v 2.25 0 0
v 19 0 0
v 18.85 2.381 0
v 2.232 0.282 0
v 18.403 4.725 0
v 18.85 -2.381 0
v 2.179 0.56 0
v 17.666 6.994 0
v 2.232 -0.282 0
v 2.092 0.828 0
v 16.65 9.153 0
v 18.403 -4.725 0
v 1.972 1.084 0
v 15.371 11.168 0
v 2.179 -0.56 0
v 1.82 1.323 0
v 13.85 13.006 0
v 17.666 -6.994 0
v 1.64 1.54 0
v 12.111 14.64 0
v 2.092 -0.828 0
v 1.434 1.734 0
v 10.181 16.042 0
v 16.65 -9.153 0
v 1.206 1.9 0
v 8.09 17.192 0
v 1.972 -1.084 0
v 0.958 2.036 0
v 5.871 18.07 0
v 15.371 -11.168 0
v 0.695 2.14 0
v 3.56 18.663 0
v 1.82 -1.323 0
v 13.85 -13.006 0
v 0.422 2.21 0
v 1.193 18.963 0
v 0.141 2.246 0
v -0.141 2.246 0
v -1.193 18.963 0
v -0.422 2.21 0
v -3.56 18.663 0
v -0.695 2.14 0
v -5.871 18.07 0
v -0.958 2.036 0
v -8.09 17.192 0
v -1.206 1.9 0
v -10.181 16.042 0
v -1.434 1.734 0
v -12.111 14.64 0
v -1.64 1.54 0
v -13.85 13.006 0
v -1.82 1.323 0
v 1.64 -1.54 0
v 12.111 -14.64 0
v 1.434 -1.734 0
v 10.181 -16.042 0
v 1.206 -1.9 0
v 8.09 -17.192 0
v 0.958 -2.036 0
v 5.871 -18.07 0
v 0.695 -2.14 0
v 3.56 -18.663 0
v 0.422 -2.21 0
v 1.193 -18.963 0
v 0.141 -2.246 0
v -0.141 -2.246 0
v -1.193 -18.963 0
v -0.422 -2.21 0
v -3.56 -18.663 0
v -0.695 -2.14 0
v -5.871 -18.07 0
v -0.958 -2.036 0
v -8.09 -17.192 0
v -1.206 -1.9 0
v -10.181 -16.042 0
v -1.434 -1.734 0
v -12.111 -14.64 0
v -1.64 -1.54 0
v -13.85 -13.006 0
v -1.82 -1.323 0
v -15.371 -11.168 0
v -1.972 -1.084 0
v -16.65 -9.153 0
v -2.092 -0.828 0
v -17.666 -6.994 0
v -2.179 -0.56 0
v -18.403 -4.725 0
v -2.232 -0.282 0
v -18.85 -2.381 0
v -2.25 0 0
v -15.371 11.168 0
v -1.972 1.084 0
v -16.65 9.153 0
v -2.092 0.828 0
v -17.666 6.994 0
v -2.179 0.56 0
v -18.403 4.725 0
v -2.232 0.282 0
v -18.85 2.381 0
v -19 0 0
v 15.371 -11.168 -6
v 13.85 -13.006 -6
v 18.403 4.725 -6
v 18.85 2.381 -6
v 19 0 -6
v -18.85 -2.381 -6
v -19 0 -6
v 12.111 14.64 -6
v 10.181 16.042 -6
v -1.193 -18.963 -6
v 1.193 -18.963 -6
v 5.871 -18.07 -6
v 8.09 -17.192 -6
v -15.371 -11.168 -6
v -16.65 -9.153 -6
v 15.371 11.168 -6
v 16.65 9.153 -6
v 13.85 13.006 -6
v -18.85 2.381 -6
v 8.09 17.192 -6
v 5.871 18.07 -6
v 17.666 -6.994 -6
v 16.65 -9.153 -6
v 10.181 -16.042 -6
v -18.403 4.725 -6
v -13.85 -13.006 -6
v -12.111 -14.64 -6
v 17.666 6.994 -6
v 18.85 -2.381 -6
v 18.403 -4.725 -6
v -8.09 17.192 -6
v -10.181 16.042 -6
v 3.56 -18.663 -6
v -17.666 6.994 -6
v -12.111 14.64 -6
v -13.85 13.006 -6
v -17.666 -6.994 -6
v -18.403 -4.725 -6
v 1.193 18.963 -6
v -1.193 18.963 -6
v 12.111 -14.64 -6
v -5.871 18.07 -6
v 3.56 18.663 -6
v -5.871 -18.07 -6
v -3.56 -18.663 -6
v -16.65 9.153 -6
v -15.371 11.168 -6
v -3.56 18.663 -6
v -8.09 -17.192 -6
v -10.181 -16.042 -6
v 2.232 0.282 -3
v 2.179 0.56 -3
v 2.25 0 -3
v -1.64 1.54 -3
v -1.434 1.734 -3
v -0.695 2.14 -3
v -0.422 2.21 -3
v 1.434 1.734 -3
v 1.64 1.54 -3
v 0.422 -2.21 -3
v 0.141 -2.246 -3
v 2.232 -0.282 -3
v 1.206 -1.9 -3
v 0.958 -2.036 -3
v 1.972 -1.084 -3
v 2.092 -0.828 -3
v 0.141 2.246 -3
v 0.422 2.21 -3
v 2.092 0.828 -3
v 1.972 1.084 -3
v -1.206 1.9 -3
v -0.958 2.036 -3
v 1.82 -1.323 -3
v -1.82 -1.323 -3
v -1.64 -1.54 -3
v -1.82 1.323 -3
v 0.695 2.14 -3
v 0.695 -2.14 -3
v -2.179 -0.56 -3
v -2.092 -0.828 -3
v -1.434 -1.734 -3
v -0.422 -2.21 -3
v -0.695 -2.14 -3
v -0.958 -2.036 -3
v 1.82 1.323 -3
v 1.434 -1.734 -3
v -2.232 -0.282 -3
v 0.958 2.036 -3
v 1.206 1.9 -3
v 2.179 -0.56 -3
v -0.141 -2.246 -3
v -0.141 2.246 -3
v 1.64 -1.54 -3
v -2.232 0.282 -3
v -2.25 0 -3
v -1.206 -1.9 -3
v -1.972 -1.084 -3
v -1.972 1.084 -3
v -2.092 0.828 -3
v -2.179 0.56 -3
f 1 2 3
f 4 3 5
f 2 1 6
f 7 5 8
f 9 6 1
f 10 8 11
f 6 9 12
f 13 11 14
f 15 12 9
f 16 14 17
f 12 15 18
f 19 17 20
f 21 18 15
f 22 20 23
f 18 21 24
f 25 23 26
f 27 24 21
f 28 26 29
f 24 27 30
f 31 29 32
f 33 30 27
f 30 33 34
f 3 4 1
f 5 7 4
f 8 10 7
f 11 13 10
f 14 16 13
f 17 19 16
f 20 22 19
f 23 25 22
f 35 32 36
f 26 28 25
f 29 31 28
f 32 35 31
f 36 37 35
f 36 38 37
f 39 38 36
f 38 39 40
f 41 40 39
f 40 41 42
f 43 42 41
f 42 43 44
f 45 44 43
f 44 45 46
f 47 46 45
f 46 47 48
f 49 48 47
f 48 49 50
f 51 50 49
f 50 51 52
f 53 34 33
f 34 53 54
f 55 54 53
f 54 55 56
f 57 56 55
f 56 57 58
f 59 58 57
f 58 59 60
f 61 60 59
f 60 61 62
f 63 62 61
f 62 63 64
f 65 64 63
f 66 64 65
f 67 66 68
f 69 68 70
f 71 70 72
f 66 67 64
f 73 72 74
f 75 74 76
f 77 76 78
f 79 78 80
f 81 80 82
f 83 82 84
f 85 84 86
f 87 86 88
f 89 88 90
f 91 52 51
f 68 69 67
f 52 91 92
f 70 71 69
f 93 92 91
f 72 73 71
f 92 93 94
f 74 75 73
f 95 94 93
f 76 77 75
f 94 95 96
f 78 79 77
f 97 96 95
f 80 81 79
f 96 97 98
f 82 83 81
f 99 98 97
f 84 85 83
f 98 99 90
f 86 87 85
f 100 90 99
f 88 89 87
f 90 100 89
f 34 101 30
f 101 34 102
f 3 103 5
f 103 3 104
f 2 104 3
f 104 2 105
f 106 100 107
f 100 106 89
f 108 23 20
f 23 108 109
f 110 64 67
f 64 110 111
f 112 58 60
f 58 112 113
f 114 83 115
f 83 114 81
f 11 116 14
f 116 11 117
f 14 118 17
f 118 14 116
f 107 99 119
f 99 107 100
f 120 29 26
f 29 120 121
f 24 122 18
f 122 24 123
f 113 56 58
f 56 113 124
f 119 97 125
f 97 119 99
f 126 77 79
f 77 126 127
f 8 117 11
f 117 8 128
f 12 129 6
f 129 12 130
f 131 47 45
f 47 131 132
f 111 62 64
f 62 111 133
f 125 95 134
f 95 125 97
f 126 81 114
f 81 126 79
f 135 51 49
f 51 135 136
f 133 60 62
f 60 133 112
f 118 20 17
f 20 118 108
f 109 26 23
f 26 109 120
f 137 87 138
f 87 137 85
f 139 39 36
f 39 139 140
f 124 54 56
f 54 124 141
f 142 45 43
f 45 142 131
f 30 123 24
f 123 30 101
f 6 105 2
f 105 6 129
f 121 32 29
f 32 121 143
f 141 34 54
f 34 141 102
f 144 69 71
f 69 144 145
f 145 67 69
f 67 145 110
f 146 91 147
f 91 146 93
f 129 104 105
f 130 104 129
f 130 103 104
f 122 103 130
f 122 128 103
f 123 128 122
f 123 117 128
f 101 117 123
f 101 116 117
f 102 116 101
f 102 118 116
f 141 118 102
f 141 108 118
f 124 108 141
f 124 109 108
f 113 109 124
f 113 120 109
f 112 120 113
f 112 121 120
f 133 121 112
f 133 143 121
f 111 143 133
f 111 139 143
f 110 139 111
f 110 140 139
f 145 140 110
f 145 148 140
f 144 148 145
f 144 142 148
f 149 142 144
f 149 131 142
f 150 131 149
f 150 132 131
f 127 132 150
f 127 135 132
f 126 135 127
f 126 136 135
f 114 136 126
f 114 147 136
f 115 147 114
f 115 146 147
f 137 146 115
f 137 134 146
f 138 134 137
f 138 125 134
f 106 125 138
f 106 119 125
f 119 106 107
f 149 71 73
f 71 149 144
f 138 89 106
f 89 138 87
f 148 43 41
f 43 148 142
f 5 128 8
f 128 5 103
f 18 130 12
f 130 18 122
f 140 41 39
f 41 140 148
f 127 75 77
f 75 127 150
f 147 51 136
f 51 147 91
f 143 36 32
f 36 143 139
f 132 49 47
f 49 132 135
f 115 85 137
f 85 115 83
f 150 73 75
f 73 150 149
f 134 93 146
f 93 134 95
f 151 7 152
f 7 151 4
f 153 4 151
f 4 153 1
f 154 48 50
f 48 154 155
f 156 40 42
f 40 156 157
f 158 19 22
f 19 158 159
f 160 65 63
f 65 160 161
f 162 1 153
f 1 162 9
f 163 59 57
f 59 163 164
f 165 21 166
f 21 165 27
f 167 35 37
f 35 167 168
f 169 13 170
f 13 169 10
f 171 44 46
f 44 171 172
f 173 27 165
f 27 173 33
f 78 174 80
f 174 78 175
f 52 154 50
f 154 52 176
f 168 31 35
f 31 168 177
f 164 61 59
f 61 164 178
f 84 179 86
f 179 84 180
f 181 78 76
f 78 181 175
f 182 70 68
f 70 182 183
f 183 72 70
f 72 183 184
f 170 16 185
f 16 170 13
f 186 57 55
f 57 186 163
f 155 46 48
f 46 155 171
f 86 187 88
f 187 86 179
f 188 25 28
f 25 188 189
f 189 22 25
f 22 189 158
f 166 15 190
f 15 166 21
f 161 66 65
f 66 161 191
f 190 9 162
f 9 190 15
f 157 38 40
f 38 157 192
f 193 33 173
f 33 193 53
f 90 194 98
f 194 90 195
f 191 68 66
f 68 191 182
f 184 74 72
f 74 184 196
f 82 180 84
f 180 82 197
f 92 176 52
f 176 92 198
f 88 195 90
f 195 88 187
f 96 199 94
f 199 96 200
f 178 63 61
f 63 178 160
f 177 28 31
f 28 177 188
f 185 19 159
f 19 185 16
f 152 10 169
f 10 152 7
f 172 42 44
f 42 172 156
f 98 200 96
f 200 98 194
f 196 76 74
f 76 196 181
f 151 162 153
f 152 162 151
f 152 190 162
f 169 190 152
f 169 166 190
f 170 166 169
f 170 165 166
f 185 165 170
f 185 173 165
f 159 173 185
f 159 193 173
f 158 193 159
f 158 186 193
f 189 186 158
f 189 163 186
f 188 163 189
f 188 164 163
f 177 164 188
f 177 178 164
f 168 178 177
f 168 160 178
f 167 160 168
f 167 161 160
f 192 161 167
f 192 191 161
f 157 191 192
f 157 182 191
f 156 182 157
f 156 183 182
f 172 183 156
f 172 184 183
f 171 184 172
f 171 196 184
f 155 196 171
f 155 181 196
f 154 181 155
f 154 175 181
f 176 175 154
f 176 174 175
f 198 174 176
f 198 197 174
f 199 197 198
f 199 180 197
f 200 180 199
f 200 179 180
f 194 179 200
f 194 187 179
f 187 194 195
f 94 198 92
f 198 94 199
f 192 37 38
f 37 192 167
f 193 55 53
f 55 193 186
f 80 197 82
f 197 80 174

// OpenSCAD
$fn = 50;


difference() {
	union() {
		translate(v = [0, 0, -3.0000000000]) {
			cylinder(h = 3, r = 10.0000000000);
		}
		translate(v = [0, 0, -6.0000000000]) {
			cylinder(h = 6, r = 19.0000000000);
		}
	}
	union() {
		#translate(v = [0, 0, -3]) {
			cylinder(h = 3, r = 2.2500000000);
		}
	}
}
